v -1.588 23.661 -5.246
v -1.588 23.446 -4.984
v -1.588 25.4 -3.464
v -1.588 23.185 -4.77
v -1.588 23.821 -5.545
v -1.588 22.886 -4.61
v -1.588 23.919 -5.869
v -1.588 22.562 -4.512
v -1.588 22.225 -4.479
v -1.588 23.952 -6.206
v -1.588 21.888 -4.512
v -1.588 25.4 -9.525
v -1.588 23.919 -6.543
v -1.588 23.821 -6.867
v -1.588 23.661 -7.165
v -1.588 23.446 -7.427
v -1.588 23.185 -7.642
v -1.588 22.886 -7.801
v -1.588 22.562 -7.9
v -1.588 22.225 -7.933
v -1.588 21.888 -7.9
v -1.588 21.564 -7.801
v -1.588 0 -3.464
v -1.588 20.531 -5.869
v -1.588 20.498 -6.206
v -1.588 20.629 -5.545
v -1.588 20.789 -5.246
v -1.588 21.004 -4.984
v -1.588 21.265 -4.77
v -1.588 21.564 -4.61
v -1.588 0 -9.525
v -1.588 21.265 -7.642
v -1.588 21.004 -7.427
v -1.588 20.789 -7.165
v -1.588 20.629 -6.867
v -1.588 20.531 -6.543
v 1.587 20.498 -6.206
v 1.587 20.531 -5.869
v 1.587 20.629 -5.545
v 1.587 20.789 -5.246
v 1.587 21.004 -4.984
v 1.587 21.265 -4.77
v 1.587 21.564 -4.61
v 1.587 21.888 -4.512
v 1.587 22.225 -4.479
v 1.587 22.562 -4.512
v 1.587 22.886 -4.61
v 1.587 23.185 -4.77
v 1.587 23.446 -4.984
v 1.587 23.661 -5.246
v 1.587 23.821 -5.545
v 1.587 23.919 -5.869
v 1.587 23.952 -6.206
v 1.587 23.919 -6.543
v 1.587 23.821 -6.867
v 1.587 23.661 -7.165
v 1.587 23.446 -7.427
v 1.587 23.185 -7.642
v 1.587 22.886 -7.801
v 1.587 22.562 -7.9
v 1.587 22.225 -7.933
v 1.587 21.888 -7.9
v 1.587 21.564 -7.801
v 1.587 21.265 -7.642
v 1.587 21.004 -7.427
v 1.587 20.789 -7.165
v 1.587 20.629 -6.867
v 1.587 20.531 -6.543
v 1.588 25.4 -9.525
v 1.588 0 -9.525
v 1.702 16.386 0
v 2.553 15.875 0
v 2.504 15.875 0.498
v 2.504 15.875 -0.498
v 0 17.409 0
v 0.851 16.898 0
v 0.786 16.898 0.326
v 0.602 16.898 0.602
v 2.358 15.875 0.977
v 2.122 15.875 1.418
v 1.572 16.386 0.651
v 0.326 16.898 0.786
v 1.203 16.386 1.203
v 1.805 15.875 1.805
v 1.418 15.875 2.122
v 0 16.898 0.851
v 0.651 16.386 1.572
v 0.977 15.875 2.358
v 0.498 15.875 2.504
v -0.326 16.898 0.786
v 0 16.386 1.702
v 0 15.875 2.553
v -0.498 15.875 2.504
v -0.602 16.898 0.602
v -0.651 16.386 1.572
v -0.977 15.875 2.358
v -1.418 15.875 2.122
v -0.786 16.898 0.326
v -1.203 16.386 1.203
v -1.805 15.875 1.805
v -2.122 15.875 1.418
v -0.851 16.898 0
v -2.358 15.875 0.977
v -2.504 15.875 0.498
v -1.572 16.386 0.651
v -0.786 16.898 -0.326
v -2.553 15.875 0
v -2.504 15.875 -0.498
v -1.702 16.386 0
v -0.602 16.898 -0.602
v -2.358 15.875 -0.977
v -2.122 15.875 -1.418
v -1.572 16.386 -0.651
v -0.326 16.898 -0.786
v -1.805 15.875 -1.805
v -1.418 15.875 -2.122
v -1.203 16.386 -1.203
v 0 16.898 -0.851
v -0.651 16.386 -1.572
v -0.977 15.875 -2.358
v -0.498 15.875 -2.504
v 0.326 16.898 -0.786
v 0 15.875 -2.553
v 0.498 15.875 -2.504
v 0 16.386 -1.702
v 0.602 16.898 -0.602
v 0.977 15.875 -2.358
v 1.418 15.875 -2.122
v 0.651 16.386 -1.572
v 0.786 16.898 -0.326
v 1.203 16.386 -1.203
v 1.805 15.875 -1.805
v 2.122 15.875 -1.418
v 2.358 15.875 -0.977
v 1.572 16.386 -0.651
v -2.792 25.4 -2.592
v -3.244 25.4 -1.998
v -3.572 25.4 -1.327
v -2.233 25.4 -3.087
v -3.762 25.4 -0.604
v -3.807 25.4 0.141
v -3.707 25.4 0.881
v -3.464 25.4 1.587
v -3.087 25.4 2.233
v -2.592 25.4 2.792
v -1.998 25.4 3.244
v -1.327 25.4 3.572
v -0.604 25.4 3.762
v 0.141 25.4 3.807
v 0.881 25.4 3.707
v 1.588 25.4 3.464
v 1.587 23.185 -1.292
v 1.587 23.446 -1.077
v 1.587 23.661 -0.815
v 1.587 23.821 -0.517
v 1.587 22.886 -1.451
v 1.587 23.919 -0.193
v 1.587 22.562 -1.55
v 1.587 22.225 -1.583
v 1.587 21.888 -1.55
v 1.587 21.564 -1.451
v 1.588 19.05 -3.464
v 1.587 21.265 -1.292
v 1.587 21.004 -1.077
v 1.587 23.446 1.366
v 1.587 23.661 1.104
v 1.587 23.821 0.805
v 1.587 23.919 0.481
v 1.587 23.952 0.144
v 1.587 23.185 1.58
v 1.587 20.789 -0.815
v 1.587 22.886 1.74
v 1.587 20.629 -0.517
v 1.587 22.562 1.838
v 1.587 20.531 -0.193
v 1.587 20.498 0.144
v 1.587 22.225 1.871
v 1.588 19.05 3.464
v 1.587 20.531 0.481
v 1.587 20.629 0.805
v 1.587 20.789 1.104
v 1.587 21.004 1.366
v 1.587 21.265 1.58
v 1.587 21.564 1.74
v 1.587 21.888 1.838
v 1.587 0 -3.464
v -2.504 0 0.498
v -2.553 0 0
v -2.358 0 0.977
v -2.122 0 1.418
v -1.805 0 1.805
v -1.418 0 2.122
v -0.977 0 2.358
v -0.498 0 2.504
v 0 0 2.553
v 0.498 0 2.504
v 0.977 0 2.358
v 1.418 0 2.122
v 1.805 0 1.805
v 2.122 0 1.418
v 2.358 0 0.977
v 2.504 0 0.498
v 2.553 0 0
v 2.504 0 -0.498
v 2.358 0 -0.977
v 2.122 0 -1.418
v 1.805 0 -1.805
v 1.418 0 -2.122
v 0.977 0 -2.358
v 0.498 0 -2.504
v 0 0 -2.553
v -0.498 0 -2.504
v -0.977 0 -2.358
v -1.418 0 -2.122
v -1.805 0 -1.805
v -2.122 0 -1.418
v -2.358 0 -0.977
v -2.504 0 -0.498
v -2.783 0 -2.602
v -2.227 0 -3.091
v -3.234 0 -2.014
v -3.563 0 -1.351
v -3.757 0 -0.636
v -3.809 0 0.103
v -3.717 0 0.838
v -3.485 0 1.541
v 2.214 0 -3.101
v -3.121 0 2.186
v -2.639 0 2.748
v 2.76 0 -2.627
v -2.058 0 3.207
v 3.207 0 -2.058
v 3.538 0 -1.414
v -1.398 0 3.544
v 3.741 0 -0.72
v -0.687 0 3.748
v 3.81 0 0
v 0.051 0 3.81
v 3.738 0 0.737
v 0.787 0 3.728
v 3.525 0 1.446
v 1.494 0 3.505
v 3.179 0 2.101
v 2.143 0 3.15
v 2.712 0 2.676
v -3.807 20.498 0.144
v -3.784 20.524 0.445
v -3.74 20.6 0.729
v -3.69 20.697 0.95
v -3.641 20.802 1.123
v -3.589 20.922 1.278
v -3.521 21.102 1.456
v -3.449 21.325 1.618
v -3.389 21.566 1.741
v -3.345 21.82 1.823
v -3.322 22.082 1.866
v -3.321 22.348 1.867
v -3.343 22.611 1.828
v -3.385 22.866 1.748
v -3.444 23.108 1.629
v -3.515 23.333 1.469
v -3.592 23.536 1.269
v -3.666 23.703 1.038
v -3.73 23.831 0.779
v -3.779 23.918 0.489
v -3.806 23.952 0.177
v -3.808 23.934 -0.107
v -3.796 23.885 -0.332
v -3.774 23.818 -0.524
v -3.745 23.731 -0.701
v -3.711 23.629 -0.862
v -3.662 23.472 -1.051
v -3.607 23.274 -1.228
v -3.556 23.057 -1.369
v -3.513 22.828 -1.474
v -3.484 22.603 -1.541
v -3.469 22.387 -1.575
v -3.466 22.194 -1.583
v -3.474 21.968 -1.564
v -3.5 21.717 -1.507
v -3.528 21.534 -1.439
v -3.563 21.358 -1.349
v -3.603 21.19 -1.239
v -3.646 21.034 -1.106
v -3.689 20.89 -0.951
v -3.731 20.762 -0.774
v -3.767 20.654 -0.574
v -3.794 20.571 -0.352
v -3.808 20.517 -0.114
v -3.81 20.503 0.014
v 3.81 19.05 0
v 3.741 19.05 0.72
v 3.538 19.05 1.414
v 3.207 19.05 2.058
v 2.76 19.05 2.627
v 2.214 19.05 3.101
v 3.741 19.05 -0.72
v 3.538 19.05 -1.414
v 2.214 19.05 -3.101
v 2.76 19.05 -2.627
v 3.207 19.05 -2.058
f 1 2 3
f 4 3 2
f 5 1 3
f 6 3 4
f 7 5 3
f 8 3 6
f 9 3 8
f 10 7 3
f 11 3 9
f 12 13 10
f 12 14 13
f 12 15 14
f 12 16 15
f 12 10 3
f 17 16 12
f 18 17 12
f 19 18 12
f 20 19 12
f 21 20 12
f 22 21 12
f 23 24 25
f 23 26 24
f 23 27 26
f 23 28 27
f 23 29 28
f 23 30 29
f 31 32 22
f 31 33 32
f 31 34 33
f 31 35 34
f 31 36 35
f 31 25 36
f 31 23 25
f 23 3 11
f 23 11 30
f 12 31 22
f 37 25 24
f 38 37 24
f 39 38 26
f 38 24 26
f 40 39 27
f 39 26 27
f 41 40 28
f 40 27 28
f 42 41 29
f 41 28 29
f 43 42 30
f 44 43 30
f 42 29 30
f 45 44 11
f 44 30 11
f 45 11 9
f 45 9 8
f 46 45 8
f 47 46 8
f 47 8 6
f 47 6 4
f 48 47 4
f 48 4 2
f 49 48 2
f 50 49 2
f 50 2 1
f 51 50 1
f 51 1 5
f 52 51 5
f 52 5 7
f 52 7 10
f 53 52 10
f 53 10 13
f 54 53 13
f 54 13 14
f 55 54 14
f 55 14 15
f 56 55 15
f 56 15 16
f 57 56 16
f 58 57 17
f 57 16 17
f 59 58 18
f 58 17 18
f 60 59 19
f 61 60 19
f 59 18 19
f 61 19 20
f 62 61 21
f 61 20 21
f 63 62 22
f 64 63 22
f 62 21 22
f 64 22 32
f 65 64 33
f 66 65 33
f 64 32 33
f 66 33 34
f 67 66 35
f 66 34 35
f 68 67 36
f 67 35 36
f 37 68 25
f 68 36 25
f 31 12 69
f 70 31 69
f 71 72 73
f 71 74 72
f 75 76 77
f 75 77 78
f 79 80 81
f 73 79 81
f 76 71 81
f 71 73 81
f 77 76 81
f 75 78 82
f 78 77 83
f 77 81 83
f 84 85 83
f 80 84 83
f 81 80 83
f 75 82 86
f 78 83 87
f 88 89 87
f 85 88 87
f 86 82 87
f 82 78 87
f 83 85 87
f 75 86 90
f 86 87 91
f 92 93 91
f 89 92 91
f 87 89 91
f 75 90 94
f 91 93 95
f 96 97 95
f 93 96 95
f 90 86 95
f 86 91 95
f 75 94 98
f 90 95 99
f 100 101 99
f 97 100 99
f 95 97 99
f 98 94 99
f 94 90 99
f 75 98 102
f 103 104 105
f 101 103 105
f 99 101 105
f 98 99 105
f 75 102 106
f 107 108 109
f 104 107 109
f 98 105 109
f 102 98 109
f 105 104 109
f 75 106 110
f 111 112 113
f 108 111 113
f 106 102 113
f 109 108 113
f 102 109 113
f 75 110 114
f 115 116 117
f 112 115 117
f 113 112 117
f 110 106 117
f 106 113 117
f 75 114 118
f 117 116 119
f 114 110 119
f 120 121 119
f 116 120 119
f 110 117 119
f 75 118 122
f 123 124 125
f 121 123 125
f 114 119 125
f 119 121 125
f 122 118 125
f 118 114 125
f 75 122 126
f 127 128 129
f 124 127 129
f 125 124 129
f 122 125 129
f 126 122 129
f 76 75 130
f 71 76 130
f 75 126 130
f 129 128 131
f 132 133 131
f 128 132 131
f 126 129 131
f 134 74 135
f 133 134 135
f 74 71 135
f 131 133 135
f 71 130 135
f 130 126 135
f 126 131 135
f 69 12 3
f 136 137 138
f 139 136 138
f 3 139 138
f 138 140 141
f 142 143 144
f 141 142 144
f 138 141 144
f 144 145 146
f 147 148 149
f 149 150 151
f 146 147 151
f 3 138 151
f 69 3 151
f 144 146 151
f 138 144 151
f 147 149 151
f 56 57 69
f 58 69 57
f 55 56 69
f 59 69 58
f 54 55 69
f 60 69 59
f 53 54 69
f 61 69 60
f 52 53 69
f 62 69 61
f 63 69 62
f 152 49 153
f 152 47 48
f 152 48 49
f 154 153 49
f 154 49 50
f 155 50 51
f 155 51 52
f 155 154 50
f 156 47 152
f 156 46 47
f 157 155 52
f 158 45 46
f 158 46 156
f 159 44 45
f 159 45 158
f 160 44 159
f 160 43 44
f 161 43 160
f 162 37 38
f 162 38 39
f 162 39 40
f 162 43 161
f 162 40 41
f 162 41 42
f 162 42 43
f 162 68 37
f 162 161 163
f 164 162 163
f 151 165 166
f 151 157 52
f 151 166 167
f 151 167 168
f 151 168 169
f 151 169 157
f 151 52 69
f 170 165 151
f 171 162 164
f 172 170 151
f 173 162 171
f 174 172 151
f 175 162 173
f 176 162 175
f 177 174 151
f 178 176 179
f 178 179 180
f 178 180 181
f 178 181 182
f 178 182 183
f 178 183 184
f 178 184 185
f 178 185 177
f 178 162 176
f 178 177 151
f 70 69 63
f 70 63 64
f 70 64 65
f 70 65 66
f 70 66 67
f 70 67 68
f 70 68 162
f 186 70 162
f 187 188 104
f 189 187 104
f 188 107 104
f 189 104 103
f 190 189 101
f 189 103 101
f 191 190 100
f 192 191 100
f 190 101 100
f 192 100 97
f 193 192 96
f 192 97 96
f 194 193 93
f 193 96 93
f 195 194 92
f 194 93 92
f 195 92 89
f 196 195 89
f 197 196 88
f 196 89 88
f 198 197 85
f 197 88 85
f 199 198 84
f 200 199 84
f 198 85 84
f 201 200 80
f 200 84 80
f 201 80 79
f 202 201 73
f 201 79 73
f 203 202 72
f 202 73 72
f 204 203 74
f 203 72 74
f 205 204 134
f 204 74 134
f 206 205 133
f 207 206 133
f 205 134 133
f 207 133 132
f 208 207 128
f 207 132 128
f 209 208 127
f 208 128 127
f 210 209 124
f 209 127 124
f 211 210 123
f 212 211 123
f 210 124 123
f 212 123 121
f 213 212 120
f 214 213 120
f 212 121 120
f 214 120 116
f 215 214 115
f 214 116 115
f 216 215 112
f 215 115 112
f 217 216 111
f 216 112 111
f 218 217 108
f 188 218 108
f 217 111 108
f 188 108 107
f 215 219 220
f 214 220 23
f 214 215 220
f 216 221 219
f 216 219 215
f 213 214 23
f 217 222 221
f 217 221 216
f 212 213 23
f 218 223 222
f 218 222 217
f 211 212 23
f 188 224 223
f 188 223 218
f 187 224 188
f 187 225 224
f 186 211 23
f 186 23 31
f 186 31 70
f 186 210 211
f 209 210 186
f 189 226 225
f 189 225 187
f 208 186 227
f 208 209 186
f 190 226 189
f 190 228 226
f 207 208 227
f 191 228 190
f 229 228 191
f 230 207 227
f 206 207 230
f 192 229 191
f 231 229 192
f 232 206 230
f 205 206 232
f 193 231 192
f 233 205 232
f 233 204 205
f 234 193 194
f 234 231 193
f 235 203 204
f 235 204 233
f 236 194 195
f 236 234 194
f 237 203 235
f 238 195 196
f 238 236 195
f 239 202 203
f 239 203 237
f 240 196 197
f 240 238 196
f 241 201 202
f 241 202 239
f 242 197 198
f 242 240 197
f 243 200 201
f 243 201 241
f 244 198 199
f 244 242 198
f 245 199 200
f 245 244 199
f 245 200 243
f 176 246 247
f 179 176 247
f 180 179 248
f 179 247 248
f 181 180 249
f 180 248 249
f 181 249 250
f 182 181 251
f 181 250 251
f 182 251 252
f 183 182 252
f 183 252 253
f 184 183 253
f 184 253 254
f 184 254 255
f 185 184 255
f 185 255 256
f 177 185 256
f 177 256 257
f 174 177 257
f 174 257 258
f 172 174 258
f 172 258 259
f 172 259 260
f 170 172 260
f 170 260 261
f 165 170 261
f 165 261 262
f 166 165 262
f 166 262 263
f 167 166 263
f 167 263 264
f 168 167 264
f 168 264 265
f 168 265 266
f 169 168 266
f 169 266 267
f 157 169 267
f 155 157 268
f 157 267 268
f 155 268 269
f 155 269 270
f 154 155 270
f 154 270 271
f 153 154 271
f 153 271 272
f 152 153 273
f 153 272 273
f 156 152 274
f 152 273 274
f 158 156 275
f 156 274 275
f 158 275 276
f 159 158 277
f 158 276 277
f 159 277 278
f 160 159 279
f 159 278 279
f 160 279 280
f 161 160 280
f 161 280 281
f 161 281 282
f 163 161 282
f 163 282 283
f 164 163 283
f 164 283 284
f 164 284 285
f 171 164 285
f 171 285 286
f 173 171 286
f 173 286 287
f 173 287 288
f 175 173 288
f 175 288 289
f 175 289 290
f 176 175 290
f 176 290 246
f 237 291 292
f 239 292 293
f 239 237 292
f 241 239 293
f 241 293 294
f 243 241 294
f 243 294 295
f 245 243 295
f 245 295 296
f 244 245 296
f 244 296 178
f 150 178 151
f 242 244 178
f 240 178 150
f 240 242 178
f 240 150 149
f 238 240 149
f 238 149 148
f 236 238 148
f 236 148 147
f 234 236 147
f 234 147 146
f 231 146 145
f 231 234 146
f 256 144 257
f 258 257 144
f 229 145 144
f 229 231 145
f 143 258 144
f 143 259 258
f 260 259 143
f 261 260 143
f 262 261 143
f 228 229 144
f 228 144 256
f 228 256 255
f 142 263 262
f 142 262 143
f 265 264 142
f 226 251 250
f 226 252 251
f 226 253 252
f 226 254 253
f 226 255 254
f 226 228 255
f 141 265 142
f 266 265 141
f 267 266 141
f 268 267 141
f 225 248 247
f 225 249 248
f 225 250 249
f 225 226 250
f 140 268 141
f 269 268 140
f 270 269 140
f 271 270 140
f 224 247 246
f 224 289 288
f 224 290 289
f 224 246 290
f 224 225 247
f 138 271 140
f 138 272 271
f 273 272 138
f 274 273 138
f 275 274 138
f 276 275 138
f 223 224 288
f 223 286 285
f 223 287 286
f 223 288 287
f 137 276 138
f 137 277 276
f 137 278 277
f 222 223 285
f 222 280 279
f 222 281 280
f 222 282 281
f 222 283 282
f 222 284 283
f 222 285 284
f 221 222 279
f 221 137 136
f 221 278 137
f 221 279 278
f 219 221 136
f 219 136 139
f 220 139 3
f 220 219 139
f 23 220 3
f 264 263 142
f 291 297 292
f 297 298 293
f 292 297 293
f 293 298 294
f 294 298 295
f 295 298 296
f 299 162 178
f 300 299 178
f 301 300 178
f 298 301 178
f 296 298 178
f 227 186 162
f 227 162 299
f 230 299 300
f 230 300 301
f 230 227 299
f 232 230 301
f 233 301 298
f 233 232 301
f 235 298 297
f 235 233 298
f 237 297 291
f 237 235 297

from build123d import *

# Parameters (mm, degrees)
F1_DEPTH = 25.4
F2_D     = 5.1054
F2_DEPTH = 15.875
F2_TIP   = 1.5338169022
F3_W     = 6.35
F3_H     = 7.2735160964
F4_DEPTH = 2.2235
F6_D     = 3.4544


with BuildPart() as f1:
    # F0 (on Front) → F1 (new body)
    with BuildSketch(Plane.XZ):
        with BuildLine():
            ThreePointArc((1.5875, -3.4635160964), (3.2065928179, -2.0576351717), (3.81, 0))
            ThreePointArc((3.81, 0), (-2.0576351717, 3.2065928179), (-1.5875, -3.4635160964))
            Line((-1.5875, -3.4635160964), (-1.5875, 0))
            Line((-1.5875, 0), (1.5875, 0))
            Line((1.5875, 0), (1.5875, -3.4635160964))
        make_face()
        with BuildLine():
            Line((-1.5875, 0), (-1.5875, -3.4635160964))
            ThreePointArc((-1.5875, -3.4635160964), (0, -3.81), (1.5875, -3.4635160964))
            Line((1.5875, -3.4635160964), (1.5875, 0))
            Line((1.5875, 0), (-1.5875, 0))
        make_face()
        with BuildLine():
            ThreePointArc((1.5875, -3.4635160964), (0, -3.81), (-1.5875, -3.4635160964))
            Line((-1.5875, -3.4635160964), (-1.5875, -9.525))
            Line((-1.5875, -9.525), (1.5875, -9.525))
            Line((1.5875, -9.525), (1.5875, -3.4635160964))
        make_face()
    extrude(amount=-F1_DEPTH)

    # F2
    with Locations(Plane.XZ):
        with Locations((0, 0)):
            Hole(F2_D / 2, depth=F2_DEPTH)
            with Locations((0, 0, -(F2_DEPTH + F2_TIP / 2))):  # 118° drill point
                Cone(0, F2_D / 2, F2_TIP, mode=Mode.SUBTRACT)

    # F3 (on face) → F4 (cut, through all)
    with BuildSketch(Plane.YZ.offset(1.5875)):
        with Locations((22.225, 0.1732419518)):
            Rectangle(F3_W, F3_H)
    extrude(amount=F4_DEPTH, mode=Mode.SUBTRACT)

    # F6 (through all)
    with Locations(Plane.YZ.offset(1.5875)):
        with Locations((22.225, 0.1442580482), (22.225, -6.2057419518)):
            Hole(F6_D / 2)


solid = f1.part
